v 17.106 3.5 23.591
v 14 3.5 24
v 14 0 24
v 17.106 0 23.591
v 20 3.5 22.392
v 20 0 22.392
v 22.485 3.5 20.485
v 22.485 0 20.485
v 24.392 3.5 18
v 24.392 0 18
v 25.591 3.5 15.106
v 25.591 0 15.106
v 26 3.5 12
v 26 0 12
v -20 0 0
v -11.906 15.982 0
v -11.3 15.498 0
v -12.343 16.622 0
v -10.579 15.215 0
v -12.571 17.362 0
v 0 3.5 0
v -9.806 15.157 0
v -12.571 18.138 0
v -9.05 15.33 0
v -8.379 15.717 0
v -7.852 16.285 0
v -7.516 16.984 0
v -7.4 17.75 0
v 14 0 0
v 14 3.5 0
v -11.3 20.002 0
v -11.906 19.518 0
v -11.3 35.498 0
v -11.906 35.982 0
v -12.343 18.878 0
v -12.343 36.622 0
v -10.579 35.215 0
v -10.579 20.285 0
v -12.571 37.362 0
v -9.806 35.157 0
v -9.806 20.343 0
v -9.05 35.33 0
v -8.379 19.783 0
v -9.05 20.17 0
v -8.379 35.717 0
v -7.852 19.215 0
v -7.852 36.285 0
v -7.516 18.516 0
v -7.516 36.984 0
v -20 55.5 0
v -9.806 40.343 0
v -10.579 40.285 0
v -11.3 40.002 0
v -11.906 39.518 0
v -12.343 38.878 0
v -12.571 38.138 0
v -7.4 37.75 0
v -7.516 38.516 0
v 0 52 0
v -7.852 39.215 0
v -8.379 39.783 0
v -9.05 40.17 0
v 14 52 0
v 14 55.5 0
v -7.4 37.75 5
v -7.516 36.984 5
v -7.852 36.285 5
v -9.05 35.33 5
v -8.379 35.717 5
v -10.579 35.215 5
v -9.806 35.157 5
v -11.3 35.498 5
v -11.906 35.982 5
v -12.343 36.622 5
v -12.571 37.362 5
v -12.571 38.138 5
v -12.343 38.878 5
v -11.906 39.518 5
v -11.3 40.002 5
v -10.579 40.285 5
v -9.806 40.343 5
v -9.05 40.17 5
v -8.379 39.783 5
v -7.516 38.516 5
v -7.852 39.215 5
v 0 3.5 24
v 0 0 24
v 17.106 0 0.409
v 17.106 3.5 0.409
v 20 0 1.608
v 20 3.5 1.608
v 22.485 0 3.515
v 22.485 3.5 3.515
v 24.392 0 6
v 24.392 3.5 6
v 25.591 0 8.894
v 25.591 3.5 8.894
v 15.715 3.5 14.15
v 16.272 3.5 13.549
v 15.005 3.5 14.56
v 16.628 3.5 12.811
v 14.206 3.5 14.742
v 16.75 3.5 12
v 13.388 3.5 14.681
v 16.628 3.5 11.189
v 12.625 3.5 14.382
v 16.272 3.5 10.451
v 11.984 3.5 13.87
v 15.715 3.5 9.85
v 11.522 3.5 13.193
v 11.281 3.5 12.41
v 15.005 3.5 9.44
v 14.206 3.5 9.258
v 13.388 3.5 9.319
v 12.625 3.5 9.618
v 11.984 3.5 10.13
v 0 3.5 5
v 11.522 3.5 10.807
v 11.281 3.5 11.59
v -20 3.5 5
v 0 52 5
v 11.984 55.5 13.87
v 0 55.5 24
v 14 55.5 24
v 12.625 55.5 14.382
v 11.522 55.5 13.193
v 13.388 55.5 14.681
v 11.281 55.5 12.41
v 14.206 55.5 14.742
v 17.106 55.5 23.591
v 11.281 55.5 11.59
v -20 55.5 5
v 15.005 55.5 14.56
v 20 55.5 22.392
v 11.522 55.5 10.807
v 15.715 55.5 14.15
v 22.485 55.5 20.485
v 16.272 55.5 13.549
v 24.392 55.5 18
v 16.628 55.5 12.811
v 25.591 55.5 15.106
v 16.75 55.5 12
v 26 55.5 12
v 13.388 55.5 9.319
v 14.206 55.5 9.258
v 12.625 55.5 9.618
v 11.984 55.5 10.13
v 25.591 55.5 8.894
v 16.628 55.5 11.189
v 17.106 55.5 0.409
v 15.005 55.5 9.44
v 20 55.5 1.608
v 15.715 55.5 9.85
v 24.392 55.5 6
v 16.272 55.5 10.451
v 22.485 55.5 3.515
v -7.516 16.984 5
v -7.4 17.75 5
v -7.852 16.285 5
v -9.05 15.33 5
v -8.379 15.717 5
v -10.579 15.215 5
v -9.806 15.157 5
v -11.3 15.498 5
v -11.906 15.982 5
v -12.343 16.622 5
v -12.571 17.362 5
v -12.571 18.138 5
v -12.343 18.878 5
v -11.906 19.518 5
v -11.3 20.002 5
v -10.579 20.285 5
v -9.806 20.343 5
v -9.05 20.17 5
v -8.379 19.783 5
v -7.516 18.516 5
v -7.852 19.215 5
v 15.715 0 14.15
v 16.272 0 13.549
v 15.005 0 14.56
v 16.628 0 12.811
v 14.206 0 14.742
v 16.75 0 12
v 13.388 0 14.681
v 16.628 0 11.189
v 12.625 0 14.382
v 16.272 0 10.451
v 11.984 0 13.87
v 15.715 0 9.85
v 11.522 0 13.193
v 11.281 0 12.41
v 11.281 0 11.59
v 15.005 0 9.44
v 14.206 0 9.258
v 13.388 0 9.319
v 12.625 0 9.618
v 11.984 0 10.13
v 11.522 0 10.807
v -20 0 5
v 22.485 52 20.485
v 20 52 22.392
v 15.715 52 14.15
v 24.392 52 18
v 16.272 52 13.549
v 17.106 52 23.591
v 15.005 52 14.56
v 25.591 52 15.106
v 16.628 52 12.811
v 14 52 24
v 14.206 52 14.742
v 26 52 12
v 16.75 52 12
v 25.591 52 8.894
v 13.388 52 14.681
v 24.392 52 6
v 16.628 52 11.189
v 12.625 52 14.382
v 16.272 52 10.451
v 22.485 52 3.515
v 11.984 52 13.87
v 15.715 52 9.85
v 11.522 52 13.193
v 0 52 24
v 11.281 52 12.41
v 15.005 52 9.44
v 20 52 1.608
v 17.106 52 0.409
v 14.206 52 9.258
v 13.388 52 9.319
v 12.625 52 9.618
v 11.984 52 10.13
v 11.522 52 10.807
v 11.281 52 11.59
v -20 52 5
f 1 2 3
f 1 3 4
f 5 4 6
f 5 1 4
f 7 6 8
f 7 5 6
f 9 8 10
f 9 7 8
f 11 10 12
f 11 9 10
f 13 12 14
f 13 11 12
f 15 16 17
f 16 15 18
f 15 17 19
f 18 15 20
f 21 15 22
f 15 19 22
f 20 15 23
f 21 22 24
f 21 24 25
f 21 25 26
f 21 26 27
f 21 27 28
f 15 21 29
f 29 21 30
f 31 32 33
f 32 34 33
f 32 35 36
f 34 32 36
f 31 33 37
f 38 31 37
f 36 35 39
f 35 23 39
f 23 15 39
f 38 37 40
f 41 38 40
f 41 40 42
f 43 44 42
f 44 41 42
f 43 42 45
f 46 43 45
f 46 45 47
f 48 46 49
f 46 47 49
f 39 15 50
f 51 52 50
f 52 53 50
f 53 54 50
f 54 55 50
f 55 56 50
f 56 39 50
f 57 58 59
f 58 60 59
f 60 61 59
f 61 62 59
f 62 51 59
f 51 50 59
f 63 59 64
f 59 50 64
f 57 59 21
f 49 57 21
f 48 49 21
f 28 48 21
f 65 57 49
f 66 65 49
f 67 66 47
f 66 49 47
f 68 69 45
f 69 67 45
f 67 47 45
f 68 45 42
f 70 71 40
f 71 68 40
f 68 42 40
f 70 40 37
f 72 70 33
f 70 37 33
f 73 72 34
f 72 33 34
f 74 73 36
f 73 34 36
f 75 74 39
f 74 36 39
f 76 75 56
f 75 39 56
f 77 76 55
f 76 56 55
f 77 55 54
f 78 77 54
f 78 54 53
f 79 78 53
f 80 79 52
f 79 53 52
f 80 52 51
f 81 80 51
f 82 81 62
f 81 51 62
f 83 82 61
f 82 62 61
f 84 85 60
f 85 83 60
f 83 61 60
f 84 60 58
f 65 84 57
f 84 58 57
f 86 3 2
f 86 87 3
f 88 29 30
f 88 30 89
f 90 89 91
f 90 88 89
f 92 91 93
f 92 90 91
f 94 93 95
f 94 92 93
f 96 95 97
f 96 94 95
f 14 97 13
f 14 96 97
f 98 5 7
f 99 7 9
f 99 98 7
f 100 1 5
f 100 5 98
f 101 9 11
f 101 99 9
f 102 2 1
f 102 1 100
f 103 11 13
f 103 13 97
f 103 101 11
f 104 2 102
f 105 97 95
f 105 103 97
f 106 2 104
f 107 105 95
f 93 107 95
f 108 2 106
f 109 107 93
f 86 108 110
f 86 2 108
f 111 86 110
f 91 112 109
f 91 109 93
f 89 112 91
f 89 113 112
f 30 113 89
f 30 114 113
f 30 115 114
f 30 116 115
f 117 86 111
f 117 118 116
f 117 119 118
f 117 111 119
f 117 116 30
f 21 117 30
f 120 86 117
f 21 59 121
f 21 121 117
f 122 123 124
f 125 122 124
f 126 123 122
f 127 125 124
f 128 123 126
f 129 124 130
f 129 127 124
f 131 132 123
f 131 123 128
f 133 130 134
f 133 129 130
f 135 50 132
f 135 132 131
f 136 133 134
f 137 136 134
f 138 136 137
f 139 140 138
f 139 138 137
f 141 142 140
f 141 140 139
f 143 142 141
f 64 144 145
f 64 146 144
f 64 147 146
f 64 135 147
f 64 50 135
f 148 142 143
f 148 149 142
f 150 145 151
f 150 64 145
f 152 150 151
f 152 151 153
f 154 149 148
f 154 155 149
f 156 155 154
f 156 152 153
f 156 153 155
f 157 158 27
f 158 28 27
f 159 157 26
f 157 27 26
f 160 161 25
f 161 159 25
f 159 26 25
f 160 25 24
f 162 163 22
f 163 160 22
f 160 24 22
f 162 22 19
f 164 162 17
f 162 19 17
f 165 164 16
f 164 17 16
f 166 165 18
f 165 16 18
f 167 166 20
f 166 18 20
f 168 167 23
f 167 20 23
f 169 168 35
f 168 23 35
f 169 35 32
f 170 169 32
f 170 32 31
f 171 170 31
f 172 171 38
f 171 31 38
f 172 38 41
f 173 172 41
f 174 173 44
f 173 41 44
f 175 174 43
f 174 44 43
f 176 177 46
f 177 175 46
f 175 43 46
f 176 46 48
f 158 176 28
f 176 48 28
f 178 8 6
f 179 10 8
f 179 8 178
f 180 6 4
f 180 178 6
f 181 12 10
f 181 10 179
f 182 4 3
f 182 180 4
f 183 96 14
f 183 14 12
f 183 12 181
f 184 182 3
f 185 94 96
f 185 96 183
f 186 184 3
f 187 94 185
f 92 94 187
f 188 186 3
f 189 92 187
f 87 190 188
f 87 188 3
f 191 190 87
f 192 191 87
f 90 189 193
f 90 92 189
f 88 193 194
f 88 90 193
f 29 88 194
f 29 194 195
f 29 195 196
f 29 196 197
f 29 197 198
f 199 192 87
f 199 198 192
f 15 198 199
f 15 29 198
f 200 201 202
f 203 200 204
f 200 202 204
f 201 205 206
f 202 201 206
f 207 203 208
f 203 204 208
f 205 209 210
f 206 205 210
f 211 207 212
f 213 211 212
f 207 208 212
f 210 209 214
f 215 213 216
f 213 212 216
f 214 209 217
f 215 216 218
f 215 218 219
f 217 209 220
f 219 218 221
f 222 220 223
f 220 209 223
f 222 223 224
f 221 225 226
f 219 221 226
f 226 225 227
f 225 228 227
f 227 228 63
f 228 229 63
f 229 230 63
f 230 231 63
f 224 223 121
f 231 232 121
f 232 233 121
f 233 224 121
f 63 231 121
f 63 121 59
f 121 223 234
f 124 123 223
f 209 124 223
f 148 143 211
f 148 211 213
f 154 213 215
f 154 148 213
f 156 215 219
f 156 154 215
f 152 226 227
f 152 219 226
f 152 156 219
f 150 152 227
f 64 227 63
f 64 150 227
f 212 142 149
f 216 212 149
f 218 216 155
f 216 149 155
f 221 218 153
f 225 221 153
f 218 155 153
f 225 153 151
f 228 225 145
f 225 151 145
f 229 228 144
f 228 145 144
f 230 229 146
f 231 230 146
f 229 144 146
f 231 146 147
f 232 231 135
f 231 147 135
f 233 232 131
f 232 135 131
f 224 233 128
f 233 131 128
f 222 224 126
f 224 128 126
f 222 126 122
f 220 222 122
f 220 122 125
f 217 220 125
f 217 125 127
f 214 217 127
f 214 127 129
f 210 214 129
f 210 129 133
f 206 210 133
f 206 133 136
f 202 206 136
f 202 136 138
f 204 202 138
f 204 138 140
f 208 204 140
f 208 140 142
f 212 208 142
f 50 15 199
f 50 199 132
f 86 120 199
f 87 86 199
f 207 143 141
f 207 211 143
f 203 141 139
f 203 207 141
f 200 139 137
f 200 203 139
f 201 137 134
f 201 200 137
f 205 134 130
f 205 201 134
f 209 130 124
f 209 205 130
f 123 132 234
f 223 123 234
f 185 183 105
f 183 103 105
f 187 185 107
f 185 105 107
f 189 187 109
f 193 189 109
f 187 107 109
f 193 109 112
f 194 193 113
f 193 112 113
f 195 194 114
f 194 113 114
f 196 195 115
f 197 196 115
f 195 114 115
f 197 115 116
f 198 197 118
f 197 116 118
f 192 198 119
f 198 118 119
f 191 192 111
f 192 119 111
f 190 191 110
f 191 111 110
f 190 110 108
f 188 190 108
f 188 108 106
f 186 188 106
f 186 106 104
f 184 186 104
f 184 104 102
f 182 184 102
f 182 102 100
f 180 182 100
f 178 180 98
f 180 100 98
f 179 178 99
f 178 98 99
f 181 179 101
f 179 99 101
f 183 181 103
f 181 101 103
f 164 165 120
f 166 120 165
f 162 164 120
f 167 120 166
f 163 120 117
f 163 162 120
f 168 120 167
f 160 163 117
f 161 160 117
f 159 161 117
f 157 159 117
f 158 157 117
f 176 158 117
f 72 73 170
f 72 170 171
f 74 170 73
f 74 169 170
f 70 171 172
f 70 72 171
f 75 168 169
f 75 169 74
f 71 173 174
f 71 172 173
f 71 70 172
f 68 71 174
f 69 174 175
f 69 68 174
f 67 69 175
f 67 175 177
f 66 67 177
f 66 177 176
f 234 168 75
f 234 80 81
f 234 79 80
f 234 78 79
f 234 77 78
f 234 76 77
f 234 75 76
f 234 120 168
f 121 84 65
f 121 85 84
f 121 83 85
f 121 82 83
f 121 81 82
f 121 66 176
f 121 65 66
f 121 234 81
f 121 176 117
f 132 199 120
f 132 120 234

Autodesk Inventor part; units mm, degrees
ref_plane "YZ Plane" through (0, 0, 0) normal (1, 0, 0) x (0, 1, 0)
ref_plane "XZ Plane" through (0, 0, 0) normal (0, 1, 0) x (-1, 0, 0)
ref_plane "XY Plane" through (0, 0, 0) normal (0, 0, 1) x (1, 0, 0)
sketch "Sketch1" plane through (0, 0, 0) normal (0, 0, 1) x (1, 0, 0)
  line L0 (0, 0) -> (-20, 0)
  line L1 (-20, 0) -> (-20, 55.5)
  line L2 (-20, 55.5) -> (0, 55.5)
  line L3 (0, 55.5) -> (0, 0)
  line L4 (-10, 0) -> (-10, 55.5) construction
  circle A0 centre (-10, 37.75) radius 2.6
  circle A1 centre (-10, 17.75) radius 2.6
  dimension "d0" = 20
  dimension "d1" = 55.5
  dimension "d2" = 5.2
  dimension "d3" = 5.2
  dimension "d4" = 17.75
  dimension "d5" = 17.75
extrude "Extrusion1" add sketch "Sketch1" along normal blind 5
sketch "Sketch2" plane through (0, 0, 0) normal (1, 0, 0) x (0, 0, -1)
  line L0 (0, 55.5) -> (-5, 55.5) projected
  line L1 (0, 55.5) -> (-24, 55.5)
  line L2 (-24, 55.5) -> (-24, 52)
  line L3 (-24, 52) -> (0, 52)
  line L4 (0, 52) -> (0, 55.5)
  line L5 (0, 0) -> (-5, 0) projected
  line L6 (0, 0) -> (-24, 0)
  line L7 (-24, 0) -> (-24, 3.5)
  line L8 (-24, 3.5) -> (0, 3.5)
  line L9 (0, 3.5) -> (0, 0)
  dimension "d8" = 24
  dimension "d9" = 3.5
  dimension "d10" = 24
  dimension "d11" = 3.5
extrude "Extrusion2" add sketch "Sketch2" along normal blind 26
fillet "Fillet1" radius 12 4 edges at (26, 53.75, 0) (26, 53.75, 24) (26, 1.75, 0) (26, 1.75, 24)
sketch "Sketch3" plane through (-20, 55.5, 5) normal (0, 1, 0) x (1, 0, 0)
  arc A0 (34, -19) -> (34, 5) centre (34, -7) ccw projected
  circle A1 centre (34, -7) radius 2.75
  point P0 (20, 5)
  dimension "d15" = 5.5
extrude "Extrusion3" cut sketch "Sketch3" against normal through all
chamfer "Chamfer1" distance 20 distance2 19 1 edges at (0, 53.75, 5) measured on face at (-17.5081, 30.8759, 5)
chamfer "Chamfer2" distance 20 distance2 19 1 edges at (0, 1.75, 5) measured on face at (-17.508, 23.4574, 5)
equation "\"d3\" = d2"
equation "\"d5\" = d4"
properties part number "Y Axis Drag Chain Mount Stationary"
